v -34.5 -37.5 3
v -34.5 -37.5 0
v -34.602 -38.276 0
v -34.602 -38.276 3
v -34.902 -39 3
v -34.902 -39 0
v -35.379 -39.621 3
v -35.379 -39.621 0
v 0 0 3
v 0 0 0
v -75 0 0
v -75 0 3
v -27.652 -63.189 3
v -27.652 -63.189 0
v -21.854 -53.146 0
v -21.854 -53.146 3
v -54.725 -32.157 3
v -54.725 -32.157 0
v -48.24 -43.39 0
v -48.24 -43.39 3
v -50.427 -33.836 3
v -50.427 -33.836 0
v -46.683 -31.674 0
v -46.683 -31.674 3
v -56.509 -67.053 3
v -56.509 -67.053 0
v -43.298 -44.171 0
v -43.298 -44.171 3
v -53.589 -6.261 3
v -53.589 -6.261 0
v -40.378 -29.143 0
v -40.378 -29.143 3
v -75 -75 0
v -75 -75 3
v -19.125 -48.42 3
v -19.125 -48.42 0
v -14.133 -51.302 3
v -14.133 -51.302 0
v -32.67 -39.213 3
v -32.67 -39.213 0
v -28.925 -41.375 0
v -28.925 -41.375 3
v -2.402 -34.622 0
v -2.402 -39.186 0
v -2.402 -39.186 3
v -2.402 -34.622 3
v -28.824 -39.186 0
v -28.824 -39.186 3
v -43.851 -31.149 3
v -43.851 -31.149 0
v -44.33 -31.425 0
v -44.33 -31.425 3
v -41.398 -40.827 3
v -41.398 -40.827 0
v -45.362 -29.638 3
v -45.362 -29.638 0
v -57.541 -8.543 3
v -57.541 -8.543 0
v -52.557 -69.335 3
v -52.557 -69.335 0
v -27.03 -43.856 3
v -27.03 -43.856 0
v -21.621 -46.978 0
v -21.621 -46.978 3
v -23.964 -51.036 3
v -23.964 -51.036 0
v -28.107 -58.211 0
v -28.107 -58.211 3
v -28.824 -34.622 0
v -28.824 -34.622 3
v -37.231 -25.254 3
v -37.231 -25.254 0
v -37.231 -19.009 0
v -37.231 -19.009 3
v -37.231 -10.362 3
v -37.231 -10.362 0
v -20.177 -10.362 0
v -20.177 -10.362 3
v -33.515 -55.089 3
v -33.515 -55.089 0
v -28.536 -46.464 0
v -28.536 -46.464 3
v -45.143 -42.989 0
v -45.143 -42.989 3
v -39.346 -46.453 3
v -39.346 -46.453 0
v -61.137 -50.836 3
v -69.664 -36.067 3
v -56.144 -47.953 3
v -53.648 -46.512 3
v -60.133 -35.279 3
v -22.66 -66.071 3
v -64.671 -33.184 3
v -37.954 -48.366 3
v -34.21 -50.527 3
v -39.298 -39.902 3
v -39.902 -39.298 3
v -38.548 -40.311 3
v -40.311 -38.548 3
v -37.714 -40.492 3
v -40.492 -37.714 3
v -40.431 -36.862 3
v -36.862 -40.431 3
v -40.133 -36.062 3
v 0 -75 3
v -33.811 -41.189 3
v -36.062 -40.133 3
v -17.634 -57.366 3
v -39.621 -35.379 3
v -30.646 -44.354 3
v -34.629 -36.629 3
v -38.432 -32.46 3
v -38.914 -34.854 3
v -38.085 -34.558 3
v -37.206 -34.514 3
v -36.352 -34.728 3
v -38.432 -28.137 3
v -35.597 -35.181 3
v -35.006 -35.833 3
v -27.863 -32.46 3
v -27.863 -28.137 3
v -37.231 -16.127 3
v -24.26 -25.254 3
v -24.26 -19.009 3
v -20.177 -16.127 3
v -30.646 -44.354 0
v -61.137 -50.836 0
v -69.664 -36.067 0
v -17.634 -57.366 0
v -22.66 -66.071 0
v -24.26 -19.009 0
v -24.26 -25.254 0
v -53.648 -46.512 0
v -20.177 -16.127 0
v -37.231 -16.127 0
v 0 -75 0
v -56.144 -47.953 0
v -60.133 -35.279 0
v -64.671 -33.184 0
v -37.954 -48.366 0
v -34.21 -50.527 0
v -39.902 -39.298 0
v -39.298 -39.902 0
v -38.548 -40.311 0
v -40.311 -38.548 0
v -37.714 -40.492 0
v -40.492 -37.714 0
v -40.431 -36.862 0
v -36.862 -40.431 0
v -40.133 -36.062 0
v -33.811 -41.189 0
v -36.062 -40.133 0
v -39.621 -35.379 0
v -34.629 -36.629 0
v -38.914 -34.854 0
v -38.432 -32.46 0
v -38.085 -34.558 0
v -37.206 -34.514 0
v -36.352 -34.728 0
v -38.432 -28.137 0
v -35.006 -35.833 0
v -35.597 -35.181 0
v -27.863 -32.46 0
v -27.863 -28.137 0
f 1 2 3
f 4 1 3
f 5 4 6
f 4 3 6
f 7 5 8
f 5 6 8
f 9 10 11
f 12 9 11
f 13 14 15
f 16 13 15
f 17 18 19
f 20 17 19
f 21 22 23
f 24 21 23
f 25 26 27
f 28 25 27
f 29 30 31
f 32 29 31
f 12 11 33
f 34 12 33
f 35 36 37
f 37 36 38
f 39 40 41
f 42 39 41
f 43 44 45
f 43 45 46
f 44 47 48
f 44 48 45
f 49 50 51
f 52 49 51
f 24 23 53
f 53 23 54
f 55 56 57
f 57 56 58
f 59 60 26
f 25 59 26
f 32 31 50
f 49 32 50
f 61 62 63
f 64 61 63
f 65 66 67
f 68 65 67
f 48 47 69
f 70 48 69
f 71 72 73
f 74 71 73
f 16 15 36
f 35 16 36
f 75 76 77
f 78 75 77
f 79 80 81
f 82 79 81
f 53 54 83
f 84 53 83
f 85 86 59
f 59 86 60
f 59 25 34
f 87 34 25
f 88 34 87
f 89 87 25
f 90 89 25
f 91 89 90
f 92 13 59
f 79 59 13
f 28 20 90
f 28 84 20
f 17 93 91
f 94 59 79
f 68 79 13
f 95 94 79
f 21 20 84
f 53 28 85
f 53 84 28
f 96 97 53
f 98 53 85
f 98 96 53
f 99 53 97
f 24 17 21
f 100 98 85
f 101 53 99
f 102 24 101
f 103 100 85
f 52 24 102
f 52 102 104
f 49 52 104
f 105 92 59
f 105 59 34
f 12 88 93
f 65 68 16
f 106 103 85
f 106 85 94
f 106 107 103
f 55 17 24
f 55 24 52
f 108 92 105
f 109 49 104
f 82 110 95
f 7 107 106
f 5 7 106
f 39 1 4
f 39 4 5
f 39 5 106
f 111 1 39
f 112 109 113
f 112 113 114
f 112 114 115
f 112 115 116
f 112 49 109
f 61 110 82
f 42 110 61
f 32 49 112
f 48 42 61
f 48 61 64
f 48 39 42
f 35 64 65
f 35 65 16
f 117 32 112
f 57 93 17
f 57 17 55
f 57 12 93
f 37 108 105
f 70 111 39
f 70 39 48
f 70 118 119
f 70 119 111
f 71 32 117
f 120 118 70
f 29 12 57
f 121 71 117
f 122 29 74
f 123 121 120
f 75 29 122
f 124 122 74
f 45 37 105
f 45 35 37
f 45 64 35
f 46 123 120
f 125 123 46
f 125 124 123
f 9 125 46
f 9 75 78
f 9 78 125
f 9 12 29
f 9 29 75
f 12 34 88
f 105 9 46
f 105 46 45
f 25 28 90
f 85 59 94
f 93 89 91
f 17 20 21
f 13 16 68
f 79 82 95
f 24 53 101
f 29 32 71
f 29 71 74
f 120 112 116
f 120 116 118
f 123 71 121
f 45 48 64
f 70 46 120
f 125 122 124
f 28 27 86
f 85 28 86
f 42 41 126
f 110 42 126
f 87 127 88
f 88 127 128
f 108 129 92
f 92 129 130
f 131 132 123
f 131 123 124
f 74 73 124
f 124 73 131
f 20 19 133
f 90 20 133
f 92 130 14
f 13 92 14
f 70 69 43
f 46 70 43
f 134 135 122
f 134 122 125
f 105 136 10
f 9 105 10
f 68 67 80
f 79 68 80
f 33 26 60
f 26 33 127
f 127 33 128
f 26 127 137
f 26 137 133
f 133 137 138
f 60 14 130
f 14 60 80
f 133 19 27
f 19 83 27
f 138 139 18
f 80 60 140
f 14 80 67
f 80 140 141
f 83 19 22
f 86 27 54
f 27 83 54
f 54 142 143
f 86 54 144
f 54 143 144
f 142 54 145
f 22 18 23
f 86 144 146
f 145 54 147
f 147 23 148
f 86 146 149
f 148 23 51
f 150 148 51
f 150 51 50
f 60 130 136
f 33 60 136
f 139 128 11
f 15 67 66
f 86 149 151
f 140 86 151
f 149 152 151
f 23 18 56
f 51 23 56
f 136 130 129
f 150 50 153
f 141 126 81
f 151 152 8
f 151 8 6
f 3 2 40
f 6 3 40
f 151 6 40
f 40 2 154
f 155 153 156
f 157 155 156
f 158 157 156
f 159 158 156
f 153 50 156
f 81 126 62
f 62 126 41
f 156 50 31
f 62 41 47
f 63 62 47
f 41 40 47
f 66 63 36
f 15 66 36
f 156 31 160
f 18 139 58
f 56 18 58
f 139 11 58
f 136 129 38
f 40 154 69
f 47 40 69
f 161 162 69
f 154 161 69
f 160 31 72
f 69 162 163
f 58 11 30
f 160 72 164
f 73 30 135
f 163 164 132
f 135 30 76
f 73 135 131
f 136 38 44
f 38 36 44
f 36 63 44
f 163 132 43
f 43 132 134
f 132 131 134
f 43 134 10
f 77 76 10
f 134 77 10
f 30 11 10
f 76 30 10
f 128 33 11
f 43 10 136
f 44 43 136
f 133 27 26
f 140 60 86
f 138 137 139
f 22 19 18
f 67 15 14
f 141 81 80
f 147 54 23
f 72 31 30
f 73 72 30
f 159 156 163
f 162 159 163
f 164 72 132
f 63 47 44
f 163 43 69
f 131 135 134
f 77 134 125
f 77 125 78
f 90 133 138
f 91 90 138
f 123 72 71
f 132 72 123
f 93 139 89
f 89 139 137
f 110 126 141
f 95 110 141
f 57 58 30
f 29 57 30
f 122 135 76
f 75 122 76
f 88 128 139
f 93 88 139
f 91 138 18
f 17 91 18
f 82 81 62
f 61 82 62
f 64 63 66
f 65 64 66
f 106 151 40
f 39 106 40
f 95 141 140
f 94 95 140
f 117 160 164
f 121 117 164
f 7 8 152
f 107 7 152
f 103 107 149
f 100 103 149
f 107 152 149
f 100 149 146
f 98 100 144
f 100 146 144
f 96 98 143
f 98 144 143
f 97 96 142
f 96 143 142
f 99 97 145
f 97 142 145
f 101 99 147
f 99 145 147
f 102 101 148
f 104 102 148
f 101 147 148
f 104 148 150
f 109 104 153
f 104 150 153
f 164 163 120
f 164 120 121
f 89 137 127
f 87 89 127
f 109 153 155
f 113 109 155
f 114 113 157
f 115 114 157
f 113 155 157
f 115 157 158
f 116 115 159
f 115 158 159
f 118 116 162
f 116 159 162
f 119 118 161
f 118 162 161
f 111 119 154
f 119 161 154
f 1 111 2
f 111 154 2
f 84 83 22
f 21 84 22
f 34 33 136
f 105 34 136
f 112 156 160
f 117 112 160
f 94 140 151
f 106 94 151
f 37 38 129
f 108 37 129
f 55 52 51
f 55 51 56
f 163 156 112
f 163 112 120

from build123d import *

# Parameters (mm, degrees)
F1_W     = 10.5687566102
F1_H     = 4.3235812336
F1_W_2   = 12.9707455635
F1_H_2   = 6.2451735139
F1_W_3   = 26.4218887314
F1_H_3   = 4.5637749135
F1_W_4   = 17.0541275293
F1_H_4   = 5.7647768408
F2_DEPTH = 3


with BuildPart() as f2:
    # F1 (on face) → F2 (new body)
    with BuildSketch(Plane.XY):
        with BuildLine():
            Line((0, -37.5), (0, 0))
            Line((0, 0), (-37.5, 0))
            ThreePointArc((-37.5, 0), (-10.9834957055, -10.9834957055), (0, -37.5))
        make_face()
        with BuildLine():
            ThreePointArc((-64.0165042945, -10.9834957055), (-51.8506287137, -2.8545175308), (-37.5, 0))
            Line((-37.5, 0), (-75, 0))
            Line((-75, 0), (-64.0165042945, -10.9834957055))
        make_face()
        with BuildLine():
            ThreePointArc((0, -37.5), (-10.9834957055, -10.9834957055), (-37.5, 0))
            ThreePointArc((-37.5, 0), (-51.8506287137, -2.8545175308), (-64.0165042945, -10.9834957055))
            Line((-64.0165042945, -10.9834957055), (-45.3621843147, -29.6378156853))
            Line((-45.3621843147, -29.6378156853), (-57.5412176208, -8.5431112121))
            Line((-57.5412176208, -8.5431112121), (-53.5888726085, -6.2612237553))
            Line((-53.5888726085, -6.2612237553), (-40.3779282428, -29.1432506127))
            Line((-40.3779282428, -29.1432506127), (-43.8513616657, -31.1486383343))
            Line((-43.8513616657, -31.1486383343), (-39.6213203436, -35.3786796564))
            ThreePointArc((-39.6213203436, -35.3786796564), (-36.3519497029, -34.7283614025), (-34.5, -37.5))
            ThreePointArc((-34.5, -37.5), (-34.7283614025, -38.6480502971), (-35.3786796564, -39.6213203436))
            Line((-35.3786796564, -39.6213203436), (-33.8107887229, -41.1892112771))
            Line((-33.8107887229, -41.1892112771), (-32.6696971218, -39.212782648))
            Line((-32.6696971218, -39.212782648), (-28.9253659382, -41.3745732648))
            Line((-28.9253659382, -41.3745732648), (-30.6457075892, -44.3542924108))
            Line((-30.6457075892, -44.3542924108), (-28.5356548637, -46.4643451363))
            Line((-28.5356548637, -46.4643451363), (-27.0296449318, -43.8558594177))
            Line((-27.0296449318, -43.8558594177), (-21.6211660178, -46.9784461747))
            Line((-21.6211660178, -46.9784461747), (-23.9638705494, -51.0361294506))
            Line((-23.9638705494, -51.0361294506), (-21.8538164603, -53.1461835397))
            Line((-21.8538164603, -53.1461835397), (-19.1249452287, -48.4196399192))
            Line((-19.1249452287, -48.4196399192), (-14.1325020374, -51.3020283396))
            Line((-14.1325020374, -51.3020283396), (-17.6337069185, -57.3662930815))
            Line((-17.6337069185, -57.3662930815), (-10.9834957055, -64.0165042945))
            ThreePointArc((-10.9834957055, -64.0165042945), (-2.8545175308, -51.8506287137), (0, -37.5))
        make_face()
        with Locations((-33.1474598497, -30.2986530587)):
            Rectangle(F1_W, F1_H, mode=Mode.SUBTRACT)
        with Locations((-30.7454690337, -22.1318900585)):
            Rectangle(F1_W_2, F1_H_2, mode=Mode.SUBTRACT)
        with Locations((-15.6129342504, -36.9041282684)):
            Rectangle(F1_W_3, F1_H_3, mode=Mode.SUBTRACT)
        with Locations((-28.7037780508, -13.2445273921)):
            Rectangle(F1_W_4, F1_H_4, mode=Mode.SUBTRACT)
        with BuildLine():
            Line((0, -75), (0, -37.5))
            ThreePointArc((0, -37.5), (-2.8545175308, -51.8506287137), (-10.9834957055, -64.0165042945))
            Line((-10.9834957055, -64.0165042945), (0, -75))
        make_face()
        with BuildLine():
            Line((-64.0165042945, -10.9834957055), (-75, 0))
            Line((-75, 0), (-75, -37.5))
            ThreePointArc((-75, -37.5), (-72.1454824692, -23.1493712863), (-64.0165042945, -10.9834957055))
        make_face()
        with BuildLine():
            Line((-45.3621843147, -29.6378156853), (-64.0165042945, -10.9834957055))
            ThreePointArc((-64.0165042945, -10.9834957055), (-72.1454824692, -23.1493712863), (-75, -37.5))
            ThreePointArc((-75, -37.5), (-64.0165042945, -64.0165042945), (-37.5, -75))
            ThreePointArc((-37.5, -75), (-23.1493712863, -72.1454824692), (-10.9834957055, -64.0165042945))
            Line((-10.9834957055, -64.0165042945), (-17.6337069185, -57.3662930815))
            Line((-17.6337069185, -57.3662930815), (-22.659565802, -66.0713360193))
            Line((-22.659565802, -66.0713360193), (-27.6520089933, -63.1889475989))
            Line((-27.6520089933, -63.1889475989), (-21.8538164603, -53.1461835397))
            Line((-21.8538164603, -53.1461835397), (-23.9638705494, -51.0361294506))
            Line((-23.9638705494, -51.0361294506), (-28.1065387995, -58.2114413387))
            Line((-28.1065387995, -58.2114413387), (-33.5150177136, -55.0888545817))
            Line((-33.5150177136, -55.0888545817), (-28.5356548637, -46.4643451363))
            Line((-28.5356548637, -46.4643451363), (-30.6457075892, -44.3542924108))
            Line((-30.6457075892, -44.3542924108), (-34.2097442432, -50.5273849756))
            Line((-34.2097442432, -50.5273849756), (-37.9540754269, -48.3655943588))
            Line((-37.9540754269, -48.3655943588), (-33.8107887229, -41.1892112771))
            Line((-33.8107887229, -41.1892112771), (-35.3786796564, -39.6213203436))
            ThreePointArc((-35.3786796564, -39.6213203436), (-39.6213203436, -39.6213203436), (-39.6213203436, -35.3786796564))
            Line((-39.6213203436, -35.3786796564), (-43.8513616657, -31.1486383343))
            Line((-43.8513616657, -31.1486383343), (-44.3302732551, -31.4251380694))
            Line((-44.3302732551, -31.4251380694), (-45.3621843147, -29.6378156853))
        make_face()
        Polygon((-43.2981931411, -44.1707336622), (-39.3458481288, -46.452621119), (-52.5567924945, -69.3346479764), (-56.5091375068, -67.0527605196), align=None, mode=Mode.SUBTRACT)
        Polygon((-56.1442129559, -47.9534442683), (-61.1366561472, -50.8358326887), (-69.6637199118, -36.066525009), (-64.6712767205, -33.1841365886), align=None, mode=Mode.SUBTRACT)
        Polygon((-48.2395132527, -43.3896637668), (-53.6479921668, -46.5122505238), (-60.1333649485, -35.2792553598), (-54.7248860345, -32.1566686028), align=None, mode=Mode.SUBTRACT)
        Polygon((-41.3984647234, -40.8267736765), (-45.142795907, -42.9885642933), (-50.4271742121, -33.8357525825), (-46.6828430285, -31.6739619657), align=None, mode=Mode.SUBTRACT)
        with BuildLine():
            Line((-37.5, -75), (0, -75))
            Line((0, -75), (-10.9834957055, -64.0165042945))
            ThreePointArc((-10.9834957055, -64.0165042945), (-23.1493712863, -72.1454824692), (-37.5, -75))
        make_face()
        with BuildLine():
            ThreePointArc((-37.5, -75), (-64.0165042945, -64.0165042945), (-75, -37.5))
            Line((-75, -37.5), (-75, -75))
            Line((-75, -75), (-37.5, -75))
        make_face()
    extrude(amount=F2_DEPTH)


solid = f2.part
